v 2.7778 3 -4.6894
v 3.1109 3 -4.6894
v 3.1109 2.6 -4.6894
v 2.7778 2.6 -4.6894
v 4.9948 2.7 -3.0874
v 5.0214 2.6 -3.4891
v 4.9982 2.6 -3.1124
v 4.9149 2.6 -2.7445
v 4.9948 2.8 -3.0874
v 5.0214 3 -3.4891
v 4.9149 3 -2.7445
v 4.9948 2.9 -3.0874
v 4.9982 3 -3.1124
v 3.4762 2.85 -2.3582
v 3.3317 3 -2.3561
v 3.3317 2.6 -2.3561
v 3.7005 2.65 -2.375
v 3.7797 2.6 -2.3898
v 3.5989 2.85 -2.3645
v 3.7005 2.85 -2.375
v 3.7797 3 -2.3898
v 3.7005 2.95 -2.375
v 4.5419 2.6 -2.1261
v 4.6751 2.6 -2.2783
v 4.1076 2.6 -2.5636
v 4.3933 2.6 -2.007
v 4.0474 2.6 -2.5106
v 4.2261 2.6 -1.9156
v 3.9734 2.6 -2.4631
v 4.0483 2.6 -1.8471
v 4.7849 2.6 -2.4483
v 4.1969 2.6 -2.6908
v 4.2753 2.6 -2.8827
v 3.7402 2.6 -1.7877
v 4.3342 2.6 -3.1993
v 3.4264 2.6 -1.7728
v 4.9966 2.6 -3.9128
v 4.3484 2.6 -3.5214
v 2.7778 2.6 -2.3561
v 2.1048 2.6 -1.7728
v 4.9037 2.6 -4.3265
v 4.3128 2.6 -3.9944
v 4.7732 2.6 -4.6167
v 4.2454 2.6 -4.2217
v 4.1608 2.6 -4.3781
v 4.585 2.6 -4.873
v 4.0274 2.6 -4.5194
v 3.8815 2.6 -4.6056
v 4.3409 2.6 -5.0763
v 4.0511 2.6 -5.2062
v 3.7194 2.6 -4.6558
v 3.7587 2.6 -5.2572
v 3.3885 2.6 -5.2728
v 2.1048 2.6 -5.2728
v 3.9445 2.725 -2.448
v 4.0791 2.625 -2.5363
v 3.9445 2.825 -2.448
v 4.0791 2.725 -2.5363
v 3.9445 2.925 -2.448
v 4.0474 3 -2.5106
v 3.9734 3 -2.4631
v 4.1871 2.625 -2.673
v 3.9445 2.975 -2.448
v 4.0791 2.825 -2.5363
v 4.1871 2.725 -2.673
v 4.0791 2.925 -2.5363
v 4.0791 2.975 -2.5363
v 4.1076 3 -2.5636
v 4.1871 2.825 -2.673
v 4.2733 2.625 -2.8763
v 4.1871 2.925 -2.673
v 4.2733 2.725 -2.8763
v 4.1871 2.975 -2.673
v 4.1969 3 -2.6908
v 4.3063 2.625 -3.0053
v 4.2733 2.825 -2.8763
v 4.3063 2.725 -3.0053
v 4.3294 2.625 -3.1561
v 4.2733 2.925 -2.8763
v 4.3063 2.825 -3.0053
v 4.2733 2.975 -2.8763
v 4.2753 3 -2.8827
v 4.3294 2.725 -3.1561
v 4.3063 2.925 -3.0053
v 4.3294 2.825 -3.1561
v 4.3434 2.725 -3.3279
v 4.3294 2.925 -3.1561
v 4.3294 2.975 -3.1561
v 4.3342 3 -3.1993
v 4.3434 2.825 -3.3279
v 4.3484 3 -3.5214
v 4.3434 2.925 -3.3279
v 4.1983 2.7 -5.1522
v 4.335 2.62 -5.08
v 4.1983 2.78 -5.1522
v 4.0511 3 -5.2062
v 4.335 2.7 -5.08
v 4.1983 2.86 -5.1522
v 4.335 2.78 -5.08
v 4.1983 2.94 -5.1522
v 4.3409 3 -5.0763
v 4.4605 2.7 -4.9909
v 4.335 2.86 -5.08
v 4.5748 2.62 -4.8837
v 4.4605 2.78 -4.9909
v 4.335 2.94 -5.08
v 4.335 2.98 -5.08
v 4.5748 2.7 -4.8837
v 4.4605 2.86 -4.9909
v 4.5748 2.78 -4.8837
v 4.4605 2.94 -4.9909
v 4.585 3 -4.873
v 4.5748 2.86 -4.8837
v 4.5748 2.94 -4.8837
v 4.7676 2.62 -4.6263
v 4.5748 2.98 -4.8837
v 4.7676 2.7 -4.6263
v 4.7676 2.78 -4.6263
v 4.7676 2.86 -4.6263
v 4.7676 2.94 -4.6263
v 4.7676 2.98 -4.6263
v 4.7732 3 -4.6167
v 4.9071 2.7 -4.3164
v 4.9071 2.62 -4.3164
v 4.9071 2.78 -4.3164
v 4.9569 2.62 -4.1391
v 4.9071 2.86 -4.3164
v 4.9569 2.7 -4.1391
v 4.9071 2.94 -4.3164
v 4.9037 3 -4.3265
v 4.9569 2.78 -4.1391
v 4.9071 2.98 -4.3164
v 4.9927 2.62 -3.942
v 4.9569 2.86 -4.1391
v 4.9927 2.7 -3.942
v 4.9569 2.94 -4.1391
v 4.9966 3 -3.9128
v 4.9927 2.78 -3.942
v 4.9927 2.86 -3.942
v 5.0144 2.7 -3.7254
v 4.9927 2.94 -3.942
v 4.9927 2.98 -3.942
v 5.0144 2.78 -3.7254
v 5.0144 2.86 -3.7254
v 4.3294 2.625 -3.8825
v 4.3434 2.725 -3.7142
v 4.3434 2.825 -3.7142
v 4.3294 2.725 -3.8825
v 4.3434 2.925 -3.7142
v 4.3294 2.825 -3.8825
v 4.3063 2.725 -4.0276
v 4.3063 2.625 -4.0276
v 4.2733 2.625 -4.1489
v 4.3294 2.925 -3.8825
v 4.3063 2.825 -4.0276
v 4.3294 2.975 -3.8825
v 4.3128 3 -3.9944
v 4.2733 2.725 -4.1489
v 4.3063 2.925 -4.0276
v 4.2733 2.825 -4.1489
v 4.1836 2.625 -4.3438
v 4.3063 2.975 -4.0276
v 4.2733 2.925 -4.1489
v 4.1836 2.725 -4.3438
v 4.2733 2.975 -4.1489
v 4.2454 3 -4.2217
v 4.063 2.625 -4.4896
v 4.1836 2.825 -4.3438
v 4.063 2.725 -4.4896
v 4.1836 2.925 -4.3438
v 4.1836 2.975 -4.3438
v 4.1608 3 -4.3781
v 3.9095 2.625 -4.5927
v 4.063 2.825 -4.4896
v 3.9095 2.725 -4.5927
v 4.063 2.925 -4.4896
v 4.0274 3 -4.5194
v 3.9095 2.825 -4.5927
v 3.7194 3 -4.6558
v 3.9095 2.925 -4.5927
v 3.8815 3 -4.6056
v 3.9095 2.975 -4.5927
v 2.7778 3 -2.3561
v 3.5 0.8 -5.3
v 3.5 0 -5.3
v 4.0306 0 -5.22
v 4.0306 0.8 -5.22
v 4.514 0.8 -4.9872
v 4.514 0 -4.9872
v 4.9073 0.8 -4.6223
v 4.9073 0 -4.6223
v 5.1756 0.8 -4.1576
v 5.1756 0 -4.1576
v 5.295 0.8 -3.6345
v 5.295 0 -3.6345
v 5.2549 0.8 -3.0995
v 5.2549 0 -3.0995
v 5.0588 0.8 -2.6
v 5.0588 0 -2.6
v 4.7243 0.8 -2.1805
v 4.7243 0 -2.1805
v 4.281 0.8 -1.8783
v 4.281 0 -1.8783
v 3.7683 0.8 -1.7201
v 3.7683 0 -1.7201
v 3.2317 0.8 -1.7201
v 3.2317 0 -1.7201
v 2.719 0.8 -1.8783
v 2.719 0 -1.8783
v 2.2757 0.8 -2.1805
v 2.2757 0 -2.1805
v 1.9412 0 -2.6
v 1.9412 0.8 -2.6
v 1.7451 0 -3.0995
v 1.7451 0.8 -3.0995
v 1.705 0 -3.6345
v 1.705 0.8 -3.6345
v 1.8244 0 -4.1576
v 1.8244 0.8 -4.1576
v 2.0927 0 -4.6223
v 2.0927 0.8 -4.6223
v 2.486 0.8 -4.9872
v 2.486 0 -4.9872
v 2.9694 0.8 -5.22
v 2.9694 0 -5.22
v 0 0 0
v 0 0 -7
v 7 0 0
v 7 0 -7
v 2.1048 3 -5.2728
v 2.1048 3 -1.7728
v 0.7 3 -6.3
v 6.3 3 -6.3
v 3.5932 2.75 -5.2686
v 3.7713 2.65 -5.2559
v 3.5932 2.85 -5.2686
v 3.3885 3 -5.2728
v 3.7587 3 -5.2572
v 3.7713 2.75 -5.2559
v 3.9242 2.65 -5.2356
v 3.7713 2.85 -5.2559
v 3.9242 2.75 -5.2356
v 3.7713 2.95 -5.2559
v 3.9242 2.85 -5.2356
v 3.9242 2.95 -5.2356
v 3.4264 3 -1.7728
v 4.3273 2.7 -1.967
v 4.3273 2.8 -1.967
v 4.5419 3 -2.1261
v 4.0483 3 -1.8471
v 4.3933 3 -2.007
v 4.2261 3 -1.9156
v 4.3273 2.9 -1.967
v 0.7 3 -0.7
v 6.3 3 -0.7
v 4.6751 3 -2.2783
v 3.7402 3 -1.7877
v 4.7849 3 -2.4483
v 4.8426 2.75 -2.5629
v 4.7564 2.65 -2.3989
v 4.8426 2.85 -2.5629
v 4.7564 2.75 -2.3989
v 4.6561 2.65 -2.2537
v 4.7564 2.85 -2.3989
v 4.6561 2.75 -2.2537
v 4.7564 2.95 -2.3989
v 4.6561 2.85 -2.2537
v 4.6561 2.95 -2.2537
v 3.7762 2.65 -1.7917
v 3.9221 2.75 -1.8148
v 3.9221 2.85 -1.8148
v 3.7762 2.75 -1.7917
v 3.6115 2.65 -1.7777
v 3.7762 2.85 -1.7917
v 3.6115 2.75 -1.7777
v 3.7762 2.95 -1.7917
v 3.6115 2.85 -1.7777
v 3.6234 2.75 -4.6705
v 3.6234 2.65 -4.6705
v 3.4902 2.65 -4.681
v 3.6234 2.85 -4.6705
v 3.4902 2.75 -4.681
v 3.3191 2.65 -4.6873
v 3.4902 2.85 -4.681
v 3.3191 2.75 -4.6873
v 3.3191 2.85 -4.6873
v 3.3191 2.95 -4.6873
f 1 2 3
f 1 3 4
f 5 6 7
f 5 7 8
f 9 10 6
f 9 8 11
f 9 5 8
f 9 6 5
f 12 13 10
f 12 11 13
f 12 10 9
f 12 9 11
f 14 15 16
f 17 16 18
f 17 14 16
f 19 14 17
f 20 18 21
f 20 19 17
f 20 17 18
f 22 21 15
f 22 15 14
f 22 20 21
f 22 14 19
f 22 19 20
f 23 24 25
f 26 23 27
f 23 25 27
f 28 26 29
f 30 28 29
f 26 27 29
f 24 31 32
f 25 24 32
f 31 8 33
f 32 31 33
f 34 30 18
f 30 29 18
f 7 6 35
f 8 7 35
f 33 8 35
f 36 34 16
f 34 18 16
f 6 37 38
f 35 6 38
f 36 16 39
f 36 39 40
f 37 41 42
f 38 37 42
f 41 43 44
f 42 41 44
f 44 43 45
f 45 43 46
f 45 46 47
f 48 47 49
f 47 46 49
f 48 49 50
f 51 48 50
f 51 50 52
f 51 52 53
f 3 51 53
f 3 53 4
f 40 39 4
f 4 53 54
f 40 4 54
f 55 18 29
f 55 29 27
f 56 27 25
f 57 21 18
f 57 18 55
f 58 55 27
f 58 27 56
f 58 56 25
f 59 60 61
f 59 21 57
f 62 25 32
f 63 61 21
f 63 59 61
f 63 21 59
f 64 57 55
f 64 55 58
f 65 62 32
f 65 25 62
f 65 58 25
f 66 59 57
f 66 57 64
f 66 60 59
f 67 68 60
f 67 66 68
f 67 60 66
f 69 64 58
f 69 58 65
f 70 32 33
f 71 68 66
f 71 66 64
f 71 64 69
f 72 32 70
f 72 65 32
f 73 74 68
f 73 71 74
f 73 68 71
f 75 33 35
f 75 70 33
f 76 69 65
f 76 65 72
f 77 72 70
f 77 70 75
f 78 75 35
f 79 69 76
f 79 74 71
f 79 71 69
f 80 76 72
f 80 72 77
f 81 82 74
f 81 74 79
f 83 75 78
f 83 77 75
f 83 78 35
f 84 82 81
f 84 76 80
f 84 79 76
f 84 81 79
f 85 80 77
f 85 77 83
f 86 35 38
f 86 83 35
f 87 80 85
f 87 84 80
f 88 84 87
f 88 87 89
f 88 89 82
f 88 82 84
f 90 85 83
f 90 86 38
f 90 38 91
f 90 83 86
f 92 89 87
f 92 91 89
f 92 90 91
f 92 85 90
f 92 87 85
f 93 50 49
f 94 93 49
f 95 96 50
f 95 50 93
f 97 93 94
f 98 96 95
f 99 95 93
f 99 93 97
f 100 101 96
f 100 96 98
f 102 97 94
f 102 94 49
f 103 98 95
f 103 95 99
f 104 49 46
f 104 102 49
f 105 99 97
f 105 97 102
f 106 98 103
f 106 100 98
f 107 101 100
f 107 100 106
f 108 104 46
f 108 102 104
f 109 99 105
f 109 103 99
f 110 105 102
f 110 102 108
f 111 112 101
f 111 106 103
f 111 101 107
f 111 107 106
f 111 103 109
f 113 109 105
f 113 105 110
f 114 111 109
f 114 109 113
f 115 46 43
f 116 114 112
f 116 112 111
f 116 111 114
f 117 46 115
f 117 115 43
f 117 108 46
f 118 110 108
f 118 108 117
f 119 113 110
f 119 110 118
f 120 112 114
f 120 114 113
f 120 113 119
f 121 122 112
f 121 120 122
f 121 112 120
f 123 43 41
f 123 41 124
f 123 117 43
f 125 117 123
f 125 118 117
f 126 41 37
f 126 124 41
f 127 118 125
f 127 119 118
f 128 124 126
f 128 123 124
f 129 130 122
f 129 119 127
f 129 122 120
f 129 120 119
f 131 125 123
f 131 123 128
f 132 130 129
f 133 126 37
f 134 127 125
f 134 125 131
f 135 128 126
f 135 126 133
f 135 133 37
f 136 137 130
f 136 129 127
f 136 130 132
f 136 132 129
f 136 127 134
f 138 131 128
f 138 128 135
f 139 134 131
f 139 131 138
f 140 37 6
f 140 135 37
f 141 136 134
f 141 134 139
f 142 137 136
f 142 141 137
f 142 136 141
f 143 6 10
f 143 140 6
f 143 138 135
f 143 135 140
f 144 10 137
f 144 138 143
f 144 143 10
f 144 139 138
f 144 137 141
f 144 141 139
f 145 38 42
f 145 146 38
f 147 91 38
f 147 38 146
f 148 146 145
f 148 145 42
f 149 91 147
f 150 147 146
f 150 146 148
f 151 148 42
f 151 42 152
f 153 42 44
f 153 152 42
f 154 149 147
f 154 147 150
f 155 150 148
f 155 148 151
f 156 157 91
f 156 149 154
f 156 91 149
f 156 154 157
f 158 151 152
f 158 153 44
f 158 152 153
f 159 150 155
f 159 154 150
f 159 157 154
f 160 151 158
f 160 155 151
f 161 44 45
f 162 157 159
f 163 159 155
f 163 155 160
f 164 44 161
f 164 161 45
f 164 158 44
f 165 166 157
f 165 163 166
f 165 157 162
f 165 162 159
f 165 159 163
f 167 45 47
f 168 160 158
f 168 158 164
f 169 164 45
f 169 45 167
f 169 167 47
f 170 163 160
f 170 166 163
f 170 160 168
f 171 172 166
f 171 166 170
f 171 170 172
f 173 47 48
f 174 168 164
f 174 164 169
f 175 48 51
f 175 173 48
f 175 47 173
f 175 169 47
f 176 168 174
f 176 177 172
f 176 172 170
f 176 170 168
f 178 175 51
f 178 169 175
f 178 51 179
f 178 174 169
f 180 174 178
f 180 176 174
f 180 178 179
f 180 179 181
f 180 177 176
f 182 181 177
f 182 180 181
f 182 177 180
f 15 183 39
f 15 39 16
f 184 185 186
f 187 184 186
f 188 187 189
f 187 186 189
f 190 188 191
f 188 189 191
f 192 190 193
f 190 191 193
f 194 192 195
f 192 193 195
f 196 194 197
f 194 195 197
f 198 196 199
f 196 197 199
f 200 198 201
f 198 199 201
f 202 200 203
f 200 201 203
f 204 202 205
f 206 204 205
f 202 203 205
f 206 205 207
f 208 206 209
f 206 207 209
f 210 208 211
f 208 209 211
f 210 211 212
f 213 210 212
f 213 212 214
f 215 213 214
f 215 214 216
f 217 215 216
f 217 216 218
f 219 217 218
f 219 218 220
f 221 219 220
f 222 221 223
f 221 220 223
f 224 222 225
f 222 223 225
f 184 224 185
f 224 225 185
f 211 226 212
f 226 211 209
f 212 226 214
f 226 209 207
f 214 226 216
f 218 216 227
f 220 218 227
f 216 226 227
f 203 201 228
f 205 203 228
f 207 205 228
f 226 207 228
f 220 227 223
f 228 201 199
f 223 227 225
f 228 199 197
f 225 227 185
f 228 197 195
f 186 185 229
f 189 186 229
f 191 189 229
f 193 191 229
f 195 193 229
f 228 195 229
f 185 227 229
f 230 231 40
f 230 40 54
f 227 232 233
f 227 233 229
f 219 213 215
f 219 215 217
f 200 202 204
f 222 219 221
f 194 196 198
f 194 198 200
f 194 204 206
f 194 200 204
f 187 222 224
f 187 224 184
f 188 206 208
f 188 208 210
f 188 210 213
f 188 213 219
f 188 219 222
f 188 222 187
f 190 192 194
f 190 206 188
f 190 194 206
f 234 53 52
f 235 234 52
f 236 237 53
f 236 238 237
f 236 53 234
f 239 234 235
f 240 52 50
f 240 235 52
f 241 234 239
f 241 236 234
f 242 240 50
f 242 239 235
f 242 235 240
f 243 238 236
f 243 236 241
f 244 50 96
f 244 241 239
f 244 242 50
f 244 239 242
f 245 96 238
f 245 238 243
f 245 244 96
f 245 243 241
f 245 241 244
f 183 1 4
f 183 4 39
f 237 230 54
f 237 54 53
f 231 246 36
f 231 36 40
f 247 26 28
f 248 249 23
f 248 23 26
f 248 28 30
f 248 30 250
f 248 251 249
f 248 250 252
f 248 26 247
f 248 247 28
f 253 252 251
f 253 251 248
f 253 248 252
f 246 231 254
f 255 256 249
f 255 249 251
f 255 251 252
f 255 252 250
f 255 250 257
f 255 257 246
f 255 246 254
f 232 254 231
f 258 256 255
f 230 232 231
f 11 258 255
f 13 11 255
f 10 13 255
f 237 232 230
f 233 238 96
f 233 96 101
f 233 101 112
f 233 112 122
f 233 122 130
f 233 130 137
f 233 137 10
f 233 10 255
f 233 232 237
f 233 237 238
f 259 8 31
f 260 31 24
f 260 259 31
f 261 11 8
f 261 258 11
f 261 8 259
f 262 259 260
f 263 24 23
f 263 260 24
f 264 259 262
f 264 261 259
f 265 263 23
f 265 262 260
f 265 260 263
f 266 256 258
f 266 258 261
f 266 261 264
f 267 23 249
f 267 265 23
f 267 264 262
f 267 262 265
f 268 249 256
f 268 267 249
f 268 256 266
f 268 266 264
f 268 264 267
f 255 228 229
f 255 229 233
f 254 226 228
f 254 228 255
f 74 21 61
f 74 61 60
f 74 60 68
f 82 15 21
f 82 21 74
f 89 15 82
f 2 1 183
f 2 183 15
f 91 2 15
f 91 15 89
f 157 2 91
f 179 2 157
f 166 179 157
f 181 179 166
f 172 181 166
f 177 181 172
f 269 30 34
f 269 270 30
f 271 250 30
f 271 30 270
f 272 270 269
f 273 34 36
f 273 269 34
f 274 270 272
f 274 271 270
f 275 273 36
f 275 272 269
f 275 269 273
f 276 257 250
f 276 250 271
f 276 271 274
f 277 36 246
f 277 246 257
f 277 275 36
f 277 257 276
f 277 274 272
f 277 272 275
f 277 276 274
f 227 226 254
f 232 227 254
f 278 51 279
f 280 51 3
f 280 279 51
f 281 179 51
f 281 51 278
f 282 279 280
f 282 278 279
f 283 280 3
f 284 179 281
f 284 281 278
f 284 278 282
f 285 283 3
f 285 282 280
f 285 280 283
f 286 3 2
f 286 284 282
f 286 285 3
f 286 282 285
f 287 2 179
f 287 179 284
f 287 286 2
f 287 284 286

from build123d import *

# Parameters (mm, degrees)
SKETCH1_W           = 7
SKETCH1_H           = 7
BOSS_EXTRUDE1_DEPTH = 3
CUT_EXTRUDE1_DEPTH  = 7
CUT_EXTRUDE2_DEPTH  = 11
SKETCH4_R           = 1.8
CUT_EXTRUDE3_DEPTH  = 0.8
CUT_EXTRUDE4_DEPTH  = 0.4


with BuildPart() as part:
    # Sketch1 → Boss-Extrude1 (new body)
    with BuildSketch(Plane(origin=(0, 0, 0), x_dir=(1, 0, 0), z_dir=(0, 1, 0))):
        with Locations((3.5, 3.5)):
            Rectangle(SKETCH1_W, SKETCH1_H)
    extrude(amount=BOSS_EXTRUDE1_DEPTH)

    # Sketch2 → Cut-Extrude1 (cut)
    with BuildSketch(Plane.XY):
        Polygon((0, 0), (0.7, 3), (0, 3), align=None)
        Polygon((7, 0), (6.3, 3), (7, 3), align=None)
    extrude(amount=-CUT_EXTRUDE1_DEPTH, mode=Mode.SUBTRACT)

    # Sketch3 → Cut-Extrude2 (cut)
    with BuildSketch(Plane(origin=(0, 0, 0), x_dir=(0, 0, -1), z_dir=(1, 0, 0))):
        Polygon((0, 0), (0.7, 3), (0, 3), align=None)
        Polygon((7, 3), (6.3, 3), (7, 0), align=None)
    extrude(amount=CUT_EXTRUDE2_DEPTH, mode=Mode.SUBTRACT)

    # Sketch4 → Cut-Extrude3 (cut)
    with BuildSketch(Plane.XZ):
        with Locations(Location((3.5, -3.5, 0), (0, 0, 270))):
            Circle(SKETCH4_R)
    extrude(amount=-CUT_EXTRUDE3_DEPTH, mode=Mode.SUBTRACT)

    # Sketch5 → Cut-Extrude4 (cut)
    with BuildSketch(Plane(origin=(0, 3, 0), x_dir=(1, 0, 0), z_dir=(0, 1, 0))):
        with BuildLine():
            Line((2.104762775, 5.272776287), (3.388516782, 5.272776287))
            add(Edge.make_bspline(
                [(3.388516782, 5.272776287), (3.423578188, 5.272794463), (3.49185089, 5.272829856), (3.590932455, 5.26871941), (3.683586456, 5.264584843), (3.769546954, 5.256308342), (3.849112172, 5.247633102), (3.922424888, 5.236649595), (3.989021979, 5.222573028), (4.031018068, 5.211471972), (4.051076878, 5.206169716)],
                knots=[0, 0, 0, 0, 1.259756885, 2.453039283, 3.563158368, 4.591894114, 5.55549294, 6.43918076, 7.254497783, 8, 8, 8, 8], degree=3))
            add(Edge.make_bspline(
                [(4.051076878, 5.206169716), (4.076161646, 5.197994199), (4.125879345, 5.181790425), (4.198767023, 5.153398715), (4.267824301, 5.118187268), (4.335613125, 5.081173488), (4.399107207, 5.037408997), (4.461666778, 4.991877903), (4.519231823, 4.939134894), (4.594720977, 4.865423065), (4.680859839, 4.762740157), (4.771103422, 4.626536439), (4.847485635, 4.477034119), (4.899673474, 4.343085246), (4.93491273, 4.229217389), (4.957948246, 4.137924241), (4.977515517, 4.041758553), (4.993580306, 3.940696082), (5.006062185, 3.834736813), (5.015355077, 3.72390899), (5.019881652, 3.608116873), (5.020906543, 3.529323002), (5.021429442, 3.489122441)],
                knots=[0, 0, 0, 0, 0.745524535, 1.477620414, 2.207090574, 2.934465325, 3.657932502, 4.384347339, 5.118673636, 5.861150177, 7.365375624, 8.894729774, 10.468936425, 12.099947606, 12.950091786, 13.83580991, 14.759228729, 15.722225242, 16.726454549, 17.773376212, 18.863978586, 20, 20, 20, 20], degree=3))
            add(Edge.make_bspline(
                [(5.021429442, 3.489122441), (5.020474912, 3.419643533), (5.01862887, 3.285272719), (4.99724236, 3.091376197), (4.966421697, 2.911281512), (4.931680416, 2.798930618), (4.914858929, 2.744531095)],
                knots=[0, 0, 0, 0, 1.103207939, 2.133582005, 3.096293362, 4, 4, 4, 4], degree=3))
            add(Edge.make_bspline(
                [(4.914858929, 2.744531095), (4.903751174, 2.713315462), (4.881900487, 2.651909444), (4.843663423, 2.56333096), (4.802348006, 2.479035433), (4.75761154, 2.399089275), (4.709228004, 2.323852087), (4.657016426, 2.253548907), (4.601786127, 2.187254174), (4.561774971, 2.146449452), (4.541862134, 2.126141671)],
                knots=[0, 0, 0, 0, 1.090884612, 2.145940218, 3.175104604, 4.181306866, 5.161203701, 6.118658341, 7.063689906, 8, 8, 8, 8], degree=3))
            add(Edge.make_bspline(
                [(4.541862134, 2.126141671), (4.509638353, 2.097162572), (4.443188324, 2.037403538), (4.326091991, 1.963449345), (4.193740208, 1.898101387), (4.098005021, 1.864533226), (4.048272391, 1.847095197)],
                knots=[0, 0, 0, 0, 0.908140292, 1.872714733, 2.8949153, 4, 4, 4, 4], degree=3))
            add(Edge.make_bspline(
                [(4.048272391, 1.847095197), (4.028252483, 1.840946487), (3.986702201, 1.828185158), (3.920820132, 1.814555795), (3.85048937, 1.800197126), (3.774898904, 1.791547242), (3.6948334, 1.782425557), (3.60965481, 1.77730424), (3.519658403, 1.773668403), (3.457932074, 1.773078068), (3.426377359, 1.772776287)],
                knots=[0, 0, 0, 0, 0.799129865, 1.658552685, 2.566799617, 3.538529252, 4.561352959, 5.643373779, 6.795284424, 8, 8, 8, 8], degree=3))
            Line((3.426377359, 1.772776287), (2.104762775, 1.772776287))
            Line((2.104762775, 1.772776287), (2.104762775, 5.272776287))
        make_face()
        with BuildLine():
            Line((2.777839698, 4.689442953), (2.777839698, 2.35610962))
            Line((2.777839698, 2.35610962), (3.331725916, 2.35610962))
            add(Edge.make_bspline(
                [(3.331725916, 2.35610962), (3.356732427, 2.356307939), (3.404879513, 2.356689778), (3.474549579, 2.357811767), (3.538575784, 2.360849202), (3.597293536, 2.36399549), (3.65054997, 2.369193709), (3.698576813, 2.374306355), (3.741106724, 2.38145884), (3.767374243, 2.387104916), (3.779742743, 2.389763466)],
                knots=[0, 0, 0, 0, 1.333384787, 2.567275092, 3.714769766, 4.750907381, 5.701951617, 6.567520054, 7.325492842, 8, 8, 8, 8], degree=3))
            add(Edge.make_bspline(
                [(3.779742743, 2.389763466), (3.808711174, 2.397493681), (3.865134036, 2.412550099), (3.944357438, 2.44611519), (4.01604441, 2.486607799), (4.08139549, 2.535298421), (4.140290341, 2.596832105), (4.190564295, 2.675528863), (4.237091515, 2.769385848), (4.268953366, 2.859230456), (4.291823741, 2.939477558), (4.307305109, 3.006830931), (4.319539616, 3.07970047), (4.330062887, 3.157798585), (4.338565941, 3.241024846), (4.343856943, 3.329679796), (4.347468084, 3.423654914), (4.348052123, 3.488183941), (4.348352519, 3.521374043)],
                knots=[0, 0, 0, 0, 1.038686998, 2.023088296, 2.974059649, 3.888265163, 4.839857954, 5.909819677, 7.113156087, 8.466843969, 9.20827164, 10.006482943, 10.861893492, 11.769681931, 12.739021491, 13.762258324, 14.849031541, 16, 16, 16, 16], degree=3))
            add(Edge.make_bspline(
                [(4.348352519, 3.521374043), (4.348054433, 3.554564247), (4.347476984, 3.618859926), (4.34387138, 3.712134321), (4.338610098, 3.799393203), (4.330046489, 3.880744437), (4.319686346, 3.956300457), (4.307308533, 4.0261252), (4.291920489, 4.089760429), (4.26903066, 4.165360255), (4.234330859, 4.250336809), (4.187111202, 4.343245577), (4.129123838, 4.422434336), (4.065053447, 4.491226906), (3.991179205, 4.547839715), (3.909400596, 4.595256239), (3.817937068, 4.632059083), (3.752876188, 4.647734621), (3.719446269, 4.655789107)],
                knots=[0, 0, 0, 0, 1.117996097, 2.165769068, 3.143980016, 4.062055362, 4.920439205, 5.712587309, 6.449616741, 7.124491204, 8.371470382, 9.537068822, 10.625202851, 11.666538334, 12.693249444, 13.747832046, 14.842779399, 16, 16, 16, 16], degree=3))
            add(Edge.make_bspline(
                [(3.719446269, 4.655789107), (3.704976171, 4.658477854), (3.673118556, 4.664397445), (3.620253908, 4.671311562), (3.558231897, 4.676442427), (3.486736347, 4.68168059), (3.406056748, 4.684670369), (3.31585552, 4.687790688), (3.21651011, 4.688856584), (3.147096928, 4.68924188), (3.110872551, 4.689442953)],
                knots=[0, 0, 0, 0, 0.578738571, 1.274160813, 2.095454135, 3.025967819, 4.093109015, 5.270126069, 6.575371698, 8, 8, 8, 8], degree=3))
            Line((3.110872551, 4.689442953), (2.777839698, 4.689442953))
        make_face(mode=Mode.SUBTRACT)
    extrude(amount=-CUT_EXTRUDE4_DEPTH, mode=Mode.SUBTRACT)


solid = part.part
